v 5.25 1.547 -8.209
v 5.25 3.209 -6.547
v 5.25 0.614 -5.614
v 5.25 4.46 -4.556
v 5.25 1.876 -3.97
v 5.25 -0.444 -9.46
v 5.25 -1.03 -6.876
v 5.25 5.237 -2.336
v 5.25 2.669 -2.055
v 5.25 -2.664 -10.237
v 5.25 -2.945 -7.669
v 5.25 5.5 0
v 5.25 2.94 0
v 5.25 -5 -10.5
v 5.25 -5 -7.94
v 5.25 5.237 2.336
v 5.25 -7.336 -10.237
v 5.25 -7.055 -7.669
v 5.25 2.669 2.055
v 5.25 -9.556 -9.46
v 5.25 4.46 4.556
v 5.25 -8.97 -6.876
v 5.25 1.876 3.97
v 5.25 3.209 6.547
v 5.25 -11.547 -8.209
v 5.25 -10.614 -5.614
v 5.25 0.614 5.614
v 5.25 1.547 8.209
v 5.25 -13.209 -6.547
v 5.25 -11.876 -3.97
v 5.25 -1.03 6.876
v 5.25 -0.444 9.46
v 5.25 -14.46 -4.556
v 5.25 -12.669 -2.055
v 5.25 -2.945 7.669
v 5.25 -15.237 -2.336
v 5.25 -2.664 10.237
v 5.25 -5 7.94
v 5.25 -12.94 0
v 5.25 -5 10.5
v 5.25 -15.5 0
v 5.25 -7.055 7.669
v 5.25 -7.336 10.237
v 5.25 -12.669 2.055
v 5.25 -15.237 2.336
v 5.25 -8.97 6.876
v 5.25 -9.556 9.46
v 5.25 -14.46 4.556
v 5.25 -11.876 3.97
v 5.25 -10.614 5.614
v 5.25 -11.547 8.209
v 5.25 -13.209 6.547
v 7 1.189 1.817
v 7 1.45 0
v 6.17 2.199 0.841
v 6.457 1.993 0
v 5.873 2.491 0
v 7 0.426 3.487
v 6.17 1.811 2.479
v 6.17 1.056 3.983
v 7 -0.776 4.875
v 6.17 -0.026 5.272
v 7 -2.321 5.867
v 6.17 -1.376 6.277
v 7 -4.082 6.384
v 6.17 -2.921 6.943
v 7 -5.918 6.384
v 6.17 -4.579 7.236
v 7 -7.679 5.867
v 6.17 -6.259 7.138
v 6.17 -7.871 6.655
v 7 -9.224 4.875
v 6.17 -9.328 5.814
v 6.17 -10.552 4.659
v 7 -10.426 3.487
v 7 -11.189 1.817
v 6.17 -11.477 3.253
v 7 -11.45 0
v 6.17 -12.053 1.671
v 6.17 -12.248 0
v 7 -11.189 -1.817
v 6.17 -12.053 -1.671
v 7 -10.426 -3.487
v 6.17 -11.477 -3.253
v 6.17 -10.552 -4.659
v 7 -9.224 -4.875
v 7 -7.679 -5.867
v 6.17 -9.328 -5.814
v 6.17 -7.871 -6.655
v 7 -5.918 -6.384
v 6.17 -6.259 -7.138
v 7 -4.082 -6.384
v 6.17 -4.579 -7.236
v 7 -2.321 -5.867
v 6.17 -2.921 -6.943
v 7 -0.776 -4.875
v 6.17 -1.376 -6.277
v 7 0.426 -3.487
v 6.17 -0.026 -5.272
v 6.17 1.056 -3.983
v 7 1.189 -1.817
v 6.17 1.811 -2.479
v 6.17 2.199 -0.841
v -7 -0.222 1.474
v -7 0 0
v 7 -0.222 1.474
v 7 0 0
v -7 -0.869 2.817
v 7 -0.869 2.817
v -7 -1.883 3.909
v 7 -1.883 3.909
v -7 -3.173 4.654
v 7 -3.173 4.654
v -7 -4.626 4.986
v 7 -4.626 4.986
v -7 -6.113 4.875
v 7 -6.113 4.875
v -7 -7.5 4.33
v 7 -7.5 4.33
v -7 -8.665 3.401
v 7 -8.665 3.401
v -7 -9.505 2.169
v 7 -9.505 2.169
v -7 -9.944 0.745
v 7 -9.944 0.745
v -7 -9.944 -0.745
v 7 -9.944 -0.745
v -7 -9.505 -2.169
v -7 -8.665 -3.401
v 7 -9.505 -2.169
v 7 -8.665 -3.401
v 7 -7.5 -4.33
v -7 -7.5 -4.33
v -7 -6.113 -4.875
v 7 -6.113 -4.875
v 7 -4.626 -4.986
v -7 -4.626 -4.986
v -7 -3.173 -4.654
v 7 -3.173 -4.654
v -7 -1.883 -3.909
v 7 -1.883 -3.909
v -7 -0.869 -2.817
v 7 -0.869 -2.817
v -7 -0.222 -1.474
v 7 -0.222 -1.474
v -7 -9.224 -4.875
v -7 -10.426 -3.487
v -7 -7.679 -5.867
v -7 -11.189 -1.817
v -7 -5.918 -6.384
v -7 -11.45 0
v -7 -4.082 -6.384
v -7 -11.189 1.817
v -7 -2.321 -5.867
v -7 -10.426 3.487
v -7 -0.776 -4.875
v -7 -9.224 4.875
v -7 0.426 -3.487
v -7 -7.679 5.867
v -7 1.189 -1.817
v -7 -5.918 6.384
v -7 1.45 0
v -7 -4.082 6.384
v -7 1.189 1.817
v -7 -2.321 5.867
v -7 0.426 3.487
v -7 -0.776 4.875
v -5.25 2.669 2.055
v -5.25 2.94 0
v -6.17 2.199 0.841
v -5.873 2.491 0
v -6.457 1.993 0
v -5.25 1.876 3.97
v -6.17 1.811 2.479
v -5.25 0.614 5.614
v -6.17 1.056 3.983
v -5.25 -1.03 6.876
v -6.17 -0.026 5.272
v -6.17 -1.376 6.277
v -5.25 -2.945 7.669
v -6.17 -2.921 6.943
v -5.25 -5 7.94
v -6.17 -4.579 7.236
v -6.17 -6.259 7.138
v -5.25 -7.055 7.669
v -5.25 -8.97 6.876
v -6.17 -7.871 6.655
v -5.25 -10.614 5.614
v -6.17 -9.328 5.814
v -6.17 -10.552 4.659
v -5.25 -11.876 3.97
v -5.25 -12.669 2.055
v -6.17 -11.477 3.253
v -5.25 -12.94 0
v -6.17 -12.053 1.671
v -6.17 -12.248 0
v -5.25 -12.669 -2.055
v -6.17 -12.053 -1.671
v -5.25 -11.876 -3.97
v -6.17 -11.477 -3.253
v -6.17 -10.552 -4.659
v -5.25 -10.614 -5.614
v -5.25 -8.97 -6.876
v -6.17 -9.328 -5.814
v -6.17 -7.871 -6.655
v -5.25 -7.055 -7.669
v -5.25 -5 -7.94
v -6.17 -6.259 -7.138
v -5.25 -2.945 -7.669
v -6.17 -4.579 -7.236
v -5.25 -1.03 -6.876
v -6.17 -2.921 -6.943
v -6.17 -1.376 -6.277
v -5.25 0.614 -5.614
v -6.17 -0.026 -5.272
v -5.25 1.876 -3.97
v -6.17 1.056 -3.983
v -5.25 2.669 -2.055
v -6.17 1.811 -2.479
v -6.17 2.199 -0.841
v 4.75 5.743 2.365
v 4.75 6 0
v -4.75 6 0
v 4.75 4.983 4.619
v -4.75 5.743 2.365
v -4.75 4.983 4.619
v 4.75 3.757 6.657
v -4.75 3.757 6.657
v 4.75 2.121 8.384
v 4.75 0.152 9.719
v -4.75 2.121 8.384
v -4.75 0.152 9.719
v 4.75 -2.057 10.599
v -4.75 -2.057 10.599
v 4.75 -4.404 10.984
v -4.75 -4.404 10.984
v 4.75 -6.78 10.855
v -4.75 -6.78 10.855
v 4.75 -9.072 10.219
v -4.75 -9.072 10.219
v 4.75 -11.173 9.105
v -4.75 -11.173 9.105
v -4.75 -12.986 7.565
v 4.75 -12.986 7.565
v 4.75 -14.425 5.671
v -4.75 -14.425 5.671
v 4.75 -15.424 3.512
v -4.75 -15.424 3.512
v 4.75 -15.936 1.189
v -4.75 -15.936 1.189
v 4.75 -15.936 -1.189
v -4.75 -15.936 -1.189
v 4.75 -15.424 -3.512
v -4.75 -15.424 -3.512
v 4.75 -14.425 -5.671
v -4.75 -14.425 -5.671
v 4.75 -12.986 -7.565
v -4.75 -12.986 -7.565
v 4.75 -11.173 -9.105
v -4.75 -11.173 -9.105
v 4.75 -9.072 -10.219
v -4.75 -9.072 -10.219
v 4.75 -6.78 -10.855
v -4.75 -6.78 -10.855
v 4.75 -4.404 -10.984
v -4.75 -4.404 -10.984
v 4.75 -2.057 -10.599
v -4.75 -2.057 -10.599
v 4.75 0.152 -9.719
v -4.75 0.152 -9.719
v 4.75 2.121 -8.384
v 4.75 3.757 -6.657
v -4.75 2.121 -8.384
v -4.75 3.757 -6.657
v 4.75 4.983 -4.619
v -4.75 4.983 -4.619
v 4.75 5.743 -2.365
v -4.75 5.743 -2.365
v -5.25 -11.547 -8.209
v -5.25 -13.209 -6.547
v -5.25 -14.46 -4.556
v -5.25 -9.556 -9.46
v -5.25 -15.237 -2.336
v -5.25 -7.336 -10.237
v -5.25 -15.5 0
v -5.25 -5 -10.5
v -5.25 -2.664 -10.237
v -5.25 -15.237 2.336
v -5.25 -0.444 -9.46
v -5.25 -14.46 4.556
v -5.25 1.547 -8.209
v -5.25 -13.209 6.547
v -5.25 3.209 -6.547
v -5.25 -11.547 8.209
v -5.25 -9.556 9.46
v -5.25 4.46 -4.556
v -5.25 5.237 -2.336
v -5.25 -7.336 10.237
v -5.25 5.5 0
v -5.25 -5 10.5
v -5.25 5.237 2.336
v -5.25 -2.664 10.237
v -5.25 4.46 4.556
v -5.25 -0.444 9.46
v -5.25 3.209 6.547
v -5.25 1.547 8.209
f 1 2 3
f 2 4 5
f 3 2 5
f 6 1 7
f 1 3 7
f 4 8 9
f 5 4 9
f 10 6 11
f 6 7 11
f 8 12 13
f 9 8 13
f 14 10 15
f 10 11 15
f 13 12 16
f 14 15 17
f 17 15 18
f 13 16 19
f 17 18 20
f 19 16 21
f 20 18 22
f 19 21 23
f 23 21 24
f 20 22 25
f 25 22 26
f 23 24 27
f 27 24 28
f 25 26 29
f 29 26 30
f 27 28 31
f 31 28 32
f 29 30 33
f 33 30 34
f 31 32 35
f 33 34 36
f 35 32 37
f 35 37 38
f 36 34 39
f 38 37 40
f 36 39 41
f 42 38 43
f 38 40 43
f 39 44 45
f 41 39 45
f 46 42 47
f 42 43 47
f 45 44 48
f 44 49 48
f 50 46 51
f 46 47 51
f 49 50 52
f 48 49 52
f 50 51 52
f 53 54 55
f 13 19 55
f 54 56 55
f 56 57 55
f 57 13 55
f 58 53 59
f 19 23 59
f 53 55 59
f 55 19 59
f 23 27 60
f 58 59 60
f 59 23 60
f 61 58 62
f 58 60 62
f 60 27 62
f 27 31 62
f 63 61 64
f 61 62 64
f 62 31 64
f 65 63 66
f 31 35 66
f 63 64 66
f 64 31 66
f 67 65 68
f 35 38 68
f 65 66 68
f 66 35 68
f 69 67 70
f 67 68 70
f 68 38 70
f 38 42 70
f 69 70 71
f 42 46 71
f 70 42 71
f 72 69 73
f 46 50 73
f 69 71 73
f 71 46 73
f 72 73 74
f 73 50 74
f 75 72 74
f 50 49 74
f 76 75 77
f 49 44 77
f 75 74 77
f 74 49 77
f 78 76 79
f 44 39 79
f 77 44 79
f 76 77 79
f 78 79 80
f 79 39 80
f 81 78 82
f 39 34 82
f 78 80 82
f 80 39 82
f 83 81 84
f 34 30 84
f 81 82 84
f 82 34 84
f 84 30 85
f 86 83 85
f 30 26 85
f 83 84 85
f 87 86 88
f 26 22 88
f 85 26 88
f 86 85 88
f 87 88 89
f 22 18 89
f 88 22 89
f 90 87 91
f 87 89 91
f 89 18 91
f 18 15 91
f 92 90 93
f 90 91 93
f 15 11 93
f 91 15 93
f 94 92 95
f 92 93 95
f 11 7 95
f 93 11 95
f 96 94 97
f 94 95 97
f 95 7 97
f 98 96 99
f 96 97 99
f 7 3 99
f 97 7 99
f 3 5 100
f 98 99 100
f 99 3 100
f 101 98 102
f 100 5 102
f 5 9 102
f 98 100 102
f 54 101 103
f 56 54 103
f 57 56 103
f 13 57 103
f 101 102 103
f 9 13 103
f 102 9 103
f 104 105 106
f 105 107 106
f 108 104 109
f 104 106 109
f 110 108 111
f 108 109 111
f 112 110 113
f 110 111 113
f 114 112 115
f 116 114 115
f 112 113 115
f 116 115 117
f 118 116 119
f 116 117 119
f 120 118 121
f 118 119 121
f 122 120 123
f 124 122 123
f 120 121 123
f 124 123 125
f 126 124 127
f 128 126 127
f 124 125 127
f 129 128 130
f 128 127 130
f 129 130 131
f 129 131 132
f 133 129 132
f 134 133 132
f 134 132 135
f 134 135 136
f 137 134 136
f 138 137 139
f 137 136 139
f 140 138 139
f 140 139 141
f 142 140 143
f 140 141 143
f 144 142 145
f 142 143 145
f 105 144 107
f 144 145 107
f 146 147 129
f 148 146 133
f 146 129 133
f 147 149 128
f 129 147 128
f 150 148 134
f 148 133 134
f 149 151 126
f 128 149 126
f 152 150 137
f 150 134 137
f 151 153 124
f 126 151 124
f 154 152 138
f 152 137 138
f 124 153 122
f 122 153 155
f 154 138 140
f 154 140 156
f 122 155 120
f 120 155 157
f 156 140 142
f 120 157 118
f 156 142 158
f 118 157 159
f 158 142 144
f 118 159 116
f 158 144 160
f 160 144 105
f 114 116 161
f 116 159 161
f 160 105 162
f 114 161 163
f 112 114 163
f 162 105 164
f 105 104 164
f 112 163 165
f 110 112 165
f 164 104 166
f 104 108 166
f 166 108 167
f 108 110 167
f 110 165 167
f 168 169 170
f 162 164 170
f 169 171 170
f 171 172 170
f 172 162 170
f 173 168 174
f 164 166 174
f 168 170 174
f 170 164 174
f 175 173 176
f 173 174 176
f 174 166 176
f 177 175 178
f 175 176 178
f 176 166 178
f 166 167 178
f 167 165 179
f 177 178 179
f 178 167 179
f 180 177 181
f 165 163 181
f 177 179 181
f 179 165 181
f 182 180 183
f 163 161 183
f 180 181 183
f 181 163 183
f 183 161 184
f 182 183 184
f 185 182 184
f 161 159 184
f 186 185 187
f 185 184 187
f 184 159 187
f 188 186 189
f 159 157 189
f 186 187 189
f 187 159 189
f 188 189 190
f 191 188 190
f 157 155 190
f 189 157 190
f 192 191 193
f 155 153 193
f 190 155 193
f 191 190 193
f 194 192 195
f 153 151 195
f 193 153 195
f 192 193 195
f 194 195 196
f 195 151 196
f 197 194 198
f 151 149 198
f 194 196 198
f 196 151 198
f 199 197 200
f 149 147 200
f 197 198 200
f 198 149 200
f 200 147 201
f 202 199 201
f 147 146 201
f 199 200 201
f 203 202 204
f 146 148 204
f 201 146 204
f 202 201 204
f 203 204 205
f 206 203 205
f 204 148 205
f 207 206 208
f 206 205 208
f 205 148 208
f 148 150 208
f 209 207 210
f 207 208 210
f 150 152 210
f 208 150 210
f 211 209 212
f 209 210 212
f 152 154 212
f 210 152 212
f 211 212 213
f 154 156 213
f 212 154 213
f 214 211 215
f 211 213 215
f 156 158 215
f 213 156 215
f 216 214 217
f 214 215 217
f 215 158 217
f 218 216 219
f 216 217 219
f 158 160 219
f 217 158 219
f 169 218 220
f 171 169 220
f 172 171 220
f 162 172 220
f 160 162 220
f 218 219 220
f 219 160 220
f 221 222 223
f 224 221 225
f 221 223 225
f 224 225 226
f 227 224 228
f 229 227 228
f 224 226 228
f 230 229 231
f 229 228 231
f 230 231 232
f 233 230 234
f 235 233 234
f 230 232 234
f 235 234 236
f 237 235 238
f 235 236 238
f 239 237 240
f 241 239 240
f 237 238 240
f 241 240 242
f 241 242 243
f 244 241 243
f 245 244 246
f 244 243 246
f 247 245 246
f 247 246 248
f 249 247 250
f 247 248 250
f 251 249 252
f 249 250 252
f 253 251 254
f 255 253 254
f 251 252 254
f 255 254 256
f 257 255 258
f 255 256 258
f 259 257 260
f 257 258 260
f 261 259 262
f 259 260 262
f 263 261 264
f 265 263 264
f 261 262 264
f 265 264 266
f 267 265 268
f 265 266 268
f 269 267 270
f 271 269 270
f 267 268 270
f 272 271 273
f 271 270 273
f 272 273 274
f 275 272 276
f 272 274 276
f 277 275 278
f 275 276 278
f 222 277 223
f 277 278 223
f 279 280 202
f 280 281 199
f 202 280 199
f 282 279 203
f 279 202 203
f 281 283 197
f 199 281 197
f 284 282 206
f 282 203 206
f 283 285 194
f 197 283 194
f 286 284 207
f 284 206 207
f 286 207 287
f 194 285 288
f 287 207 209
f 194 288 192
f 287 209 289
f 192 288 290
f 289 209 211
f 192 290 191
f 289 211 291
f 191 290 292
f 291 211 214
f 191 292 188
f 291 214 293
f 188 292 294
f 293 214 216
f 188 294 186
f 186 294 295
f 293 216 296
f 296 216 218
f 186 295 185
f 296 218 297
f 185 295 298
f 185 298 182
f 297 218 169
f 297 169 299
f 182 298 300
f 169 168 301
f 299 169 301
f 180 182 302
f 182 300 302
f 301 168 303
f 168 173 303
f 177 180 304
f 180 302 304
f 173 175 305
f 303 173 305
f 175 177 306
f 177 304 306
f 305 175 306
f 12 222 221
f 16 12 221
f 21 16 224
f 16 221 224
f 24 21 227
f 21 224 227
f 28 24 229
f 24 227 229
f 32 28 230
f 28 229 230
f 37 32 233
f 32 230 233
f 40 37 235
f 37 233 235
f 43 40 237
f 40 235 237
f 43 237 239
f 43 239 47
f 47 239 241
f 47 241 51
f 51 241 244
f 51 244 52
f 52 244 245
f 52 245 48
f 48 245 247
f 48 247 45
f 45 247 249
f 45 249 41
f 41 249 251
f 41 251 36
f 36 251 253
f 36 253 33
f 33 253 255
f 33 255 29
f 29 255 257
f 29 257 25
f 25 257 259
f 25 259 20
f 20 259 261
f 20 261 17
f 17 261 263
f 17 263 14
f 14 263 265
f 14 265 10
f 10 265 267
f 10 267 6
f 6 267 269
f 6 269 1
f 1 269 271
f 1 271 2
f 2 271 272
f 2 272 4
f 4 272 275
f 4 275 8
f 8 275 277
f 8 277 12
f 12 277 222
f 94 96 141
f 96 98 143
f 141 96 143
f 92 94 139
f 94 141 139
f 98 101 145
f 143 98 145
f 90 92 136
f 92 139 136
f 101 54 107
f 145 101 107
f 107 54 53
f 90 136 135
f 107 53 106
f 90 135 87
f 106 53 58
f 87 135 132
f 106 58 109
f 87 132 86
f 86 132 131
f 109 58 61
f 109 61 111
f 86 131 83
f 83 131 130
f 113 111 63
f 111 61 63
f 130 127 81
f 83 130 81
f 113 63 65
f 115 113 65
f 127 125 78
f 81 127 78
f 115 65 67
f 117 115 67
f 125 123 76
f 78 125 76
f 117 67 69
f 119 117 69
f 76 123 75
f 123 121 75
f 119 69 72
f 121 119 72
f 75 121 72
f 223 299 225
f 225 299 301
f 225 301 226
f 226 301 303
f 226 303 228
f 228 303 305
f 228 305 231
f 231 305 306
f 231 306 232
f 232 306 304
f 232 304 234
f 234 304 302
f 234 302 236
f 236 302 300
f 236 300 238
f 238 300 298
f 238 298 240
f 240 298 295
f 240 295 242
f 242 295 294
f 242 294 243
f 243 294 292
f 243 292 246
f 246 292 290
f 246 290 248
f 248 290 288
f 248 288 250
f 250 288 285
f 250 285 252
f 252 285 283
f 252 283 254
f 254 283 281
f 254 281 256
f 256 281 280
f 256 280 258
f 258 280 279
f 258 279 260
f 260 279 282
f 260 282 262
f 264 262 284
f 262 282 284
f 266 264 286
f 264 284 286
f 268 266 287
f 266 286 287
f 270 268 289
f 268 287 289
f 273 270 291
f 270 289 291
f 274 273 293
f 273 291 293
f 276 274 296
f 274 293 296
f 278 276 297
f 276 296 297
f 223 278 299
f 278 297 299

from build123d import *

# Parameters (mm, degrees)
SFAZOWANIE1_SIZE = 0.5


with BuildPart() as part:
    # Szkic1 → Obrót1 (revolve)
    with BuildSketch(Plane.XY):
        with BuildLine():
            Line((-7, 0), (7, 0))
            Line((7, 0), (7, 1.45))
            ThreePointArc((7, 1.45), (6.170128128, 2.247897549), (5.25, 2.939773297))
            Line((5.25, 2.939773297), (5.25, 6))
            Line((5.25, 6), (-5.25, 6))
            Line((-5.25, 6), (-5.25, 2.939773297))
            ThreePointArc((-5.25, 2.939773297), (-6.170128128, 2.247897549), (-7, 1.45))
            Line((-7, 1.45), (-7, 0))
        make_face()
    revolve(axis=Axis((-7.6504069, -5, 0), (1, 0, 0)))

    # Sfazowanie1
    sfazowanie1_edges = [part.edges().sort_by_distance(p)[0] for p in [
        (-5.25, -16, 0),
        (5.25, -16, 0),
    ]]
    chamfer(sfazowanie1_edges, length=SFAZOWANIE1_SIZE)


solid = part.part
